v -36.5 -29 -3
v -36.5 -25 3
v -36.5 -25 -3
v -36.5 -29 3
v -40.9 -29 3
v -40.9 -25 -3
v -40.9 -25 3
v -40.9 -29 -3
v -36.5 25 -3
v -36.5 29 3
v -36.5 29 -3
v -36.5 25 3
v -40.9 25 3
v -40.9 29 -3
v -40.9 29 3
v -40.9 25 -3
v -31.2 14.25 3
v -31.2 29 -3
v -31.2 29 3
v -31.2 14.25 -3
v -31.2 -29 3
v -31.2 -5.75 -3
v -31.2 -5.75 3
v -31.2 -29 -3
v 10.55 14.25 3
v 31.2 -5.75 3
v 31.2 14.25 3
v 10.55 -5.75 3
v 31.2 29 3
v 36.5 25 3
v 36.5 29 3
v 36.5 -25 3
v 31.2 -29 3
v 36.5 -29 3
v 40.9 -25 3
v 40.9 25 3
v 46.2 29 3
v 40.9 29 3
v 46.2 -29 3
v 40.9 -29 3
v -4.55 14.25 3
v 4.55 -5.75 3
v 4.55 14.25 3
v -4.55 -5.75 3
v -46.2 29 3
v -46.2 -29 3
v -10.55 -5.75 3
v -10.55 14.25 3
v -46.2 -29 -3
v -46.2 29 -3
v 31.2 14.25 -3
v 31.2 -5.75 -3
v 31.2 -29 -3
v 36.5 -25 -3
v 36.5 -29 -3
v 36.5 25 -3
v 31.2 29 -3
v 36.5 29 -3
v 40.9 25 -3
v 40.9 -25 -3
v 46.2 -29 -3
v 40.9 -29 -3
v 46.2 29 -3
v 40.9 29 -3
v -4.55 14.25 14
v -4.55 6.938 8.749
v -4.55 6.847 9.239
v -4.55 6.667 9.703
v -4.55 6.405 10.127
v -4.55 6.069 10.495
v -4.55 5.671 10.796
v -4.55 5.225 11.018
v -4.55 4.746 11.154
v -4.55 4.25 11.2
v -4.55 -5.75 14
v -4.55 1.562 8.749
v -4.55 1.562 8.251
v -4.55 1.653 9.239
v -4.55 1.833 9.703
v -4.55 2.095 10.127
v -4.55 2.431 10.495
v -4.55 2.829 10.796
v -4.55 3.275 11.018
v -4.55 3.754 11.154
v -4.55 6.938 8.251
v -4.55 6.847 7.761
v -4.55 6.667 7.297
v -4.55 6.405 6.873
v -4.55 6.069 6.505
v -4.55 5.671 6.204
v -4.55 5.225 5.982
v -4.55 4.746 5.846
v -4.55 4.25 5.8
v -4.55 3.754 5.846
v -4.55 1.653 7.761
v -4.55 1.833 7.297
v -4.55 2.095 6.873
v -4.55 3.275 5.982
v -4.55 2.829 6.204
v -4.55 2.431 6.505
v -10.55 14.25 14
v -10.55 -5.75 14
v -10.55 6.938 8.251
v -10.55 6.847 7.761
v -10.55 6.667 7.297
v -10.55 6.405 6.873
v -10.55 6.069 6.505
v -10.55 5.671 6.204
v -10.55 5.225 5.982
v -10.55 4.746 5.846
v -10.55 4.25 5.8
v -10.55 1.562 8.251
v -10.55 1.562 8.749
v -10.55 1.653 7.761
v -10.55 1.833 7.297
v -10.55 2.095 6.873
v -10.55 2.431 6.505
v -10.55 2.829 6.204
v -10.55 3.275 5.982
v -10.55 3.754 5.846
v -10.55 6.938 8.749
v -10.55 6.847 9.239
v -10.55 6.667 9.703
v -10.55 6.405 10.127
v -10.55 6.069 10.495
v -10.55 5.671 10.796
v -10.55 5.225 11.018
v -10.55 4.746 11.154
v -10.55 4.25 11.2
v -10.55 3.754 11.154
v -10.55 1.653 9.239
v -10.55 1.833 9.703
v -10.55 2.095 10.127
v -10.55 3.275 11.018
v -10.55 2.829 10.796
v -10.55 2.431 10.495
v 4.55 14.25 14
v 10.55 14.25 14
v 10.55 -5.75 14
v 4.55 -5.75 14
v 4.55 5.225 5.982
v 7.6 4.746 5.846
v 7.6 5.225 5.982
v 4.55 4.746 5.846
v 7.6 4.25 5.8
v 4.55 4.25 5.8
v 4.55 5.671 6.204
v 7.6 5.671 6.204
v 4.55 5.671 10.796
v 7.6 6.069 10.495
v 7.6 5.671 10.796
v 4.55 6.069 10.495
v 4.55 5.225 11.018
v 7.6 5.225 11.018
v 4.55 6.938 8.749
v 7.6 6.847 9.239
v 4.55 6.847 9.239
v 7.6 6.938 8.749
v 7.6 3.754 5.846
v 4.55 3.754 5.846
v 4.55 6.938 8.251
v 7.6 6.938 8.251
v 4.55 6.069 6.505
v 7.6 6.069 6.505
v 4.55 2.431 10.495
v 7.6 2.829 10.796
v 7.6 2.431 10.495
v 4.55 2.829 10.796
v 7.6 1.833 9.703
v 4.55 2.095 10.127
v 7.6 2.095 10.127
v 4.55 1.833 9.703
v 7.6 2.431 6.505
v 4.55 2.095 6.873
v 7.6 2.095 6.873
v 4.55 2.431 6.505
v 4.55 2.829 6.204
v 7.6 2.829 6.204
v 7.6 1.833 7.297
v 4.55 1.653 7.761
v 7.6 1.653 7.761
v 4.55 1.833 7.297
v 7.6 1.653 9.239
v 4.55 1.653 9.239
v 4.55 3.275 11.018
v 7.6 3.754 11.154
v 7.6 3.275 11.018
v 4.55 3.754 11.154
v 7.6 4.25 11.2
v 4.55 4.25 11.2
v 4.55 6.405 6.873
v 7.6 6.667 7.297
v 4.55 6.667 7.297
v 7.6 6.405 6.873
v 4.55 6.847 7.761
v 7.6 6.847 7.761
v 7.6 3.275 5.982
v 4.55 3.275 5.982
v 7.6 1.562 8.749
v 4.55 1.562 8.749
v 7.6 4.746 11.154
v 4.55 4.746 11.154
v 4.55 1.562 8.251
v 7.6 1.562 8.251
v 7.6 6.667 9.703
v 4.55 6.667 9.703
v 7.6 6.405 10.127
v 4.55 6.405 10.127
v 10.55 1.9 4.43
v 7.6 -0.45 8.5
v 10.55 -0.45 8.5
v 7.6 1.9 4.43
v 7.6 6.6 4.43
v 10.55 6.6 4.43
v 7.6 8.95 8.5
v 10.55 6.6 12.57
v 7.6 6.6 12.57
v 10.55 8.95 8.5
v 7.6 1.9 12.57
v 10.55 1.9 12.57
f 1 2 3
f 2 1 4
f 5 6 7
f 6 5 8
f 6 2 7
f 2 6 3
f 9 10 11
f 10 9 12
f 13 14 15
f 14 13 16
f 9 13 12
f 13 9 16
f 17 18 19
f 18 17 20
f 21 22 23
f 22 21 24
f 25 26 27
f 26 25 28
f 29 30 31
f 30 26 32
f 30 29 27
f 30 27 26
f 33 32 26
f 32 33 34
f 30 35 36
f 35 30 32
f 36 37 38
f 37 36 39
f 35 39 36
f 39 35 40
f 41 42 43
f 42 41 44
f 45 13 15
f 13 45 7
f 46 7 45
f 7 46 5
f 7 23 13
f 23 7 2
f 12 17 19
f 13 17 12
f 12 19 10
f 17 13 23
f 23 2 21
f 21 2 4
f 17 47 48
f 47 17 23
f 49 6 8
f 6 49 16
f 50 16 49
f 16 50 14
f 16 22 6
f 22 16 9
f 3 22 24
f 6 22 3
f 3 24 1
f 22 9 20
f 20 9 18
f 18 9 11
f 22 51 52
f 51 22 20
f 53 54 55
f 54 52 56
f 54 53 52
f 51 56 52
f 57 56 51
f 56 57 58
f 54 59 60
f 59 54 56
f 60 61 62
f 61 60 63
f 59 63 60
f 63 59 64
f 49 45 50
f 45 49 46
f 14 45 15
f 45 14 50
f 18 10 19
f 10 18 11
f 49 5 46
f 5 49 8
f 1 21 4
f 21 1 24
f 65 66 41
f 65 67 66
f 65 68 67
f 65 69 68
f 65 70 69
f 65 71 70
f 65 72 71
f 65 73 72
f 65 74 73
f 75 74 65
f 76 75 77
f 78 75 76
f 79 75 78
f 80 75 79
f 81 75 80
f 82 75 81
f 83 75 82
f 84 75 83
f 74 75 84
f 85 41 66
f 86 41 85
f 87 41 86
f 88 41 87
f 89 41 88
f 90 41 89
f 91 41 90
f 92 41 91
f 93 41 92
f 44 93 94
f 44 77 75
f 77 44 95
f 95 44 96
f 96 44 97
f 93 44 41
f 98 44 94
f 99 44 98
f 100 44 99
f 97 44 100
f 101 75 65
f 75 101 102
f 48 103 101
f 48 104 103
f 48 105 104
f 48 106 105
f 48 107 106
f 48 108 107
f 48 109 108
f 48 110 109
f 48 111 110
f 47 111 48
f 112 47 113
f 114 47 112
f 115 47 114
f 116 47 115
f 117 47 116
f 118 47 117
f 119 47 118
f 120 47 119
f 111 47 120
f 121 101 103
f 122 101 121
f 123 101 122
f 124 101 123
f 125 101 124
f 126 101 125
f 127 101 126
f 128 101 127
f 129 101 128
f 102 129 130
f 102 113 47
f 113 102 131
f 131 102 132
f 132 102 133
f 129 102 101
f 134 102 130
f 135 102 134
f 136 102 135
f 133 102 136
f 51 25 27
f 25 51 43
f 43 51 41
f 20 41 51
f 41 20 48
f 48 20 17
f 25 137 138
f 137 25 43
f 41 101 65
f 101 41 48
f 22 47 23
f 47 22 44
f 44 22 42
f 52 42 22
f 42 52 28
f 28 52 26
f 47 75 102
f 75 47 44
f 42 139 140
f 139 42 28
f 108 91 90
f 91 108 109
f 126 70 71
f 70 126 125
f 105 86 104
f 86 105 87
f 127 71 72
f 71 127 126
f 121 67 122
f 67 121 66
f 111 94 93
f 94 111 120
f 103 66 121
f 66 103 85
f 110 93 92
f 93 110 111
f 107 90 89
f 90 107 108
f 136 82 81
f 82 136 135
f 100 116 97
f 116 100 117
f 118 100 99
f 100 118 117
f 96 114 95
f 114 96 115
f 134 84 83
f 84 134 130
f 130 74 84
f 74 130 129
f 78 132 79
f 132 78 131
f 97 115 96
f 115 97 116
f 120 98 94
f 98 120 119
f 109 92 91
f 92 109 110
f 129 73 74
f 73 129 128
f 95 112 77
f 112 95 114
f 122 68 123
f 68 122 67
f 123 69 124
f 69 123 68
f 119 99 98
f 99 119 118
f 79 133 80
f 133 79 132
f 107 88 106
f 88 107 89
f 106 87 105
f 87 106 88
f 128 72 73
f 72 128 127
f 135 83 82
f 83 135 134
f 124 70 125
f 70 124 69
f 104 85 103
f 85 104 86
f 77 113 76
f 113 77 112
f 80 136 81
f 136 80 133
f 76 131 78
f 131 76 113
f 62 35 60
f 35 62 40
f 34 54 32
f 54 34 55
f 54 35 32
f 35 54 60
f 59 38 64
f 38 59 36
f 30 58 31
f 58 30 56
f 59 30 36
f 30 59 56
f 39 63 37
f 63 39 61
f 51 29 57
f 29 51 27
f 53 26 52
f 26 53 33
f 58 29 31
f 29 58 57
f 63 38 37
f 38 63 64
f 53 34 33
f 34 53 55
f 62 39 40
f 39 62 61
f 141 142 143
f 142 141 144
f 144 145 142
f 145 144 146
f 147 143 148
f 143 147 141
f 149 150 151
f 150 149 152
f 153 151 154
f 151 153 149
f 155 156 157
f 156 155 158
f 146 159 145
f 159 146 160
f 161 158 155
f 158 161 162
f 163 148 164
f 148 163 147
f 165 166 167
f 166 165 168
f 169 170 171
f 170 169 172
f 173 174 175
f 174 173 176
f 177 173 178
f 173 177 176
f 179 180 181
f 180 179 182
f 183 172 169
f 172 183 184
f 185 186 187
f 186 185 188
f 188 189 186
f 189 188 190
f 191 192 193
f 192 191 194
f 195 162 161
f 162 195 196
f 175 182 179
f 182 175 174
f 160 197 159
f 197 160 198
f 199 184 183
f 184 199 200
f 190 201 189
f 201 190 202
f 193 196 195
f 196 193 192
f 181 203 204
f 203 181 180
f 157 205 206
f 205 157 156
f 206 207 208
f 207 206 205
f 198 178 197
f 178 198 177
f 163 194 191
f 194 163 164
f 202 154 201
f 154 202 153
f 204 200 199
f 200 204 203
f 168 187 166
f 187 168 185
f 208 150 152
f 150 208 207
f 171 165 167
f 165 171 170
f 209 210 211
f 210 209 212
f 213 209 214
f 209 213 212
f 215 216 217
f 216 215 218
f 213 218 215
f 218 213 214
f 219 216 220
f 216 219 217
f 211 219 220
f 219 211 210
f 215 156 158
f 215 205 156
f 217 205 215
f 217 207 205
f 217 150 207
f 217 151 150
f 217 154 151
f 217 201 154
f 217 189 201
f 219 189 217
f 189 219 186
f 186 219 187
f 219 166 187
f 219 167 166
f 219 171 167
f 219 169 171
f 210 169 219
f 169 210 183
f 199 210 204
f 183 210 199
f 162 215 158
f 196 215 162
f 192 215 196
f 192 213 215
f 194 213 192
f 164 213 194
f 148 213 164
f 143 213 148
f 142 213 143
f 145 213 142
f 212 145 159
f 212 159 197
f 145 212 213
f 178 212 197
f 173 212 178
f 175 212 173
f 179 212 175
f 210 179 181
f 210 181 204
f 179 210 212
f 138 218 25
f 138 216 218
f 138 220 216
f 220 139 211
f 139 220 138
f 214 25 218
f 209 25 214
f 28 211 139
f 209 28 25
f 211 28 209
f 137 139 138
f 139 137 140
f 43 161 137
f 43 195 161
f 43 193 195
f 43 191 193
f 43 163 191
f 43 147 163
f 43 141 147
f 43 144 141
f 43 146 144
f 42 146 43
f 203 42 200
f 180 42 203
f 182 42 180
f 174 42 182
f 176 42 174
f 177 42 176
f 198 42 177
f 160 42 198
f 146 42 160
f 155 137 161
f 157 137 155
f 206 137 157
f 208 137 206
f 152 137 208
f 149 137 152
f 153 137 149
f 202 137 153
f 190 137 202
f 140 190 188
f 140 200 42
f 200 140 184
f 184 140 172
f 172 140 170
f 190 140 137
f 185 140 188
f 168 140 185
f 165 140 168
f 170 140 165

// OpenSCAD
include <cloverplus_v3_utils.scad>;
$fs = 0.5;
$fa = 0.5;
//---------------------------------------------------------------------------------------------------- 
// CloverPlus v3 power supply zip-tie mount by pbmax (mpeterson333/@/gmail.com)
//---------------------------------------------------------------------------------------------------- 
cloverplus_v3_ps_mount();

module cloverplus_v3_ps_mount()
{
  //------------------------- 
  // Variables
  //------------------------- 
  
  // Base thickness and width
  base_t = 6;
  base_w = 20;
  
  // Power supply sizing 

  // 12V 6A brick from ebay or amazon
  ps_l = 132;
  ps_w = 58;
  
  // 24V 5A brick from ebay or aazon
  //ps_l = 165;
  //ps_w = 65;
  
  base_x_ratio = 0.7;
  
  // Base length depends on power supply length
  base_l = ps_l*base_x_ratio;
  
  arm_mount_off = 1;
  arm_w = 15;
  arm_l = ps_w;
  
  // Frame connect
  fc_h = 11;
  fc_t = 6;
  // bottom frame connection point
  fc_inner_gap = leg_connector_thick*2 + leg_connector_setback*2 + 0.5;
  fc_w = base_w;
  fc_hole_off = 5.5;
  fc_hole_d = 5.4;
  fc_nuttrap_d = 9.4;
  fc_nuttrap_depth = 3;
  fc_center_to_base_bottom = 37.5;
  fc_off = (fc_center_to_base_bottom - arm_l*0.5) * 0.5;
  
  ziptie_slot_w = 4.4;
  ziptie_slot_depth = 4;
  
  
  ff = 0.1;
  
  //------------------------- 
  // Instantiation
  //------------------------- 
  
  ps_mount();
  
  //------------------------- 
  // Module
  //------------------------- 
  
  module ps_mount()
  {
    difference()
    {
      union()
      {
        // Base
        translate([0, fc_off, 0])
          cube([base_l, base_w, base_t], center=true);
  
        for(i=[-1,1])
        {
          // Arms with ziptie slots
          translate([i*(base_l*0.5-arm_w*0.5),0,0])
            difference()
            {
              cube([arm_w, arm_l, base_t], center=true);
              for(j=[-1,1])
                translate([0,j*(arm_l-ziptie_slot_depth+ff)*0.5,0])
                  cube([ziptie_slot_w, ziptie_slot_depth+ff, base_t*2], center=true);
            }
  
          // Frame connection with nuttrap and screw holes
          translate([i*(fc_t+fc_inner_gap)*0.5, fc_off, fc_h*0.5+base_t*0.5])
            difference()
            {
              cube([fc_t, fc_w, fc_h], center=true);
                translate([-fc_t*0.5+fc_nuttrap_depth*0.5-ff*0.5,0,0])
                  rotate([0,90,0])
                  {
                    cylinder(h=fc_t*2, d=fc_hole_d, center=true);
                    if (i == 1)
                      translate([0, 0, fc_t*0.5+ff])
                      rotate([0,0,30])
                        cylinder(h=fc_nuttrap_depth, d=fc_nuttrap_d, $fn=6, center=true);
                  }
            }
        }
      }
    }
  }
}
